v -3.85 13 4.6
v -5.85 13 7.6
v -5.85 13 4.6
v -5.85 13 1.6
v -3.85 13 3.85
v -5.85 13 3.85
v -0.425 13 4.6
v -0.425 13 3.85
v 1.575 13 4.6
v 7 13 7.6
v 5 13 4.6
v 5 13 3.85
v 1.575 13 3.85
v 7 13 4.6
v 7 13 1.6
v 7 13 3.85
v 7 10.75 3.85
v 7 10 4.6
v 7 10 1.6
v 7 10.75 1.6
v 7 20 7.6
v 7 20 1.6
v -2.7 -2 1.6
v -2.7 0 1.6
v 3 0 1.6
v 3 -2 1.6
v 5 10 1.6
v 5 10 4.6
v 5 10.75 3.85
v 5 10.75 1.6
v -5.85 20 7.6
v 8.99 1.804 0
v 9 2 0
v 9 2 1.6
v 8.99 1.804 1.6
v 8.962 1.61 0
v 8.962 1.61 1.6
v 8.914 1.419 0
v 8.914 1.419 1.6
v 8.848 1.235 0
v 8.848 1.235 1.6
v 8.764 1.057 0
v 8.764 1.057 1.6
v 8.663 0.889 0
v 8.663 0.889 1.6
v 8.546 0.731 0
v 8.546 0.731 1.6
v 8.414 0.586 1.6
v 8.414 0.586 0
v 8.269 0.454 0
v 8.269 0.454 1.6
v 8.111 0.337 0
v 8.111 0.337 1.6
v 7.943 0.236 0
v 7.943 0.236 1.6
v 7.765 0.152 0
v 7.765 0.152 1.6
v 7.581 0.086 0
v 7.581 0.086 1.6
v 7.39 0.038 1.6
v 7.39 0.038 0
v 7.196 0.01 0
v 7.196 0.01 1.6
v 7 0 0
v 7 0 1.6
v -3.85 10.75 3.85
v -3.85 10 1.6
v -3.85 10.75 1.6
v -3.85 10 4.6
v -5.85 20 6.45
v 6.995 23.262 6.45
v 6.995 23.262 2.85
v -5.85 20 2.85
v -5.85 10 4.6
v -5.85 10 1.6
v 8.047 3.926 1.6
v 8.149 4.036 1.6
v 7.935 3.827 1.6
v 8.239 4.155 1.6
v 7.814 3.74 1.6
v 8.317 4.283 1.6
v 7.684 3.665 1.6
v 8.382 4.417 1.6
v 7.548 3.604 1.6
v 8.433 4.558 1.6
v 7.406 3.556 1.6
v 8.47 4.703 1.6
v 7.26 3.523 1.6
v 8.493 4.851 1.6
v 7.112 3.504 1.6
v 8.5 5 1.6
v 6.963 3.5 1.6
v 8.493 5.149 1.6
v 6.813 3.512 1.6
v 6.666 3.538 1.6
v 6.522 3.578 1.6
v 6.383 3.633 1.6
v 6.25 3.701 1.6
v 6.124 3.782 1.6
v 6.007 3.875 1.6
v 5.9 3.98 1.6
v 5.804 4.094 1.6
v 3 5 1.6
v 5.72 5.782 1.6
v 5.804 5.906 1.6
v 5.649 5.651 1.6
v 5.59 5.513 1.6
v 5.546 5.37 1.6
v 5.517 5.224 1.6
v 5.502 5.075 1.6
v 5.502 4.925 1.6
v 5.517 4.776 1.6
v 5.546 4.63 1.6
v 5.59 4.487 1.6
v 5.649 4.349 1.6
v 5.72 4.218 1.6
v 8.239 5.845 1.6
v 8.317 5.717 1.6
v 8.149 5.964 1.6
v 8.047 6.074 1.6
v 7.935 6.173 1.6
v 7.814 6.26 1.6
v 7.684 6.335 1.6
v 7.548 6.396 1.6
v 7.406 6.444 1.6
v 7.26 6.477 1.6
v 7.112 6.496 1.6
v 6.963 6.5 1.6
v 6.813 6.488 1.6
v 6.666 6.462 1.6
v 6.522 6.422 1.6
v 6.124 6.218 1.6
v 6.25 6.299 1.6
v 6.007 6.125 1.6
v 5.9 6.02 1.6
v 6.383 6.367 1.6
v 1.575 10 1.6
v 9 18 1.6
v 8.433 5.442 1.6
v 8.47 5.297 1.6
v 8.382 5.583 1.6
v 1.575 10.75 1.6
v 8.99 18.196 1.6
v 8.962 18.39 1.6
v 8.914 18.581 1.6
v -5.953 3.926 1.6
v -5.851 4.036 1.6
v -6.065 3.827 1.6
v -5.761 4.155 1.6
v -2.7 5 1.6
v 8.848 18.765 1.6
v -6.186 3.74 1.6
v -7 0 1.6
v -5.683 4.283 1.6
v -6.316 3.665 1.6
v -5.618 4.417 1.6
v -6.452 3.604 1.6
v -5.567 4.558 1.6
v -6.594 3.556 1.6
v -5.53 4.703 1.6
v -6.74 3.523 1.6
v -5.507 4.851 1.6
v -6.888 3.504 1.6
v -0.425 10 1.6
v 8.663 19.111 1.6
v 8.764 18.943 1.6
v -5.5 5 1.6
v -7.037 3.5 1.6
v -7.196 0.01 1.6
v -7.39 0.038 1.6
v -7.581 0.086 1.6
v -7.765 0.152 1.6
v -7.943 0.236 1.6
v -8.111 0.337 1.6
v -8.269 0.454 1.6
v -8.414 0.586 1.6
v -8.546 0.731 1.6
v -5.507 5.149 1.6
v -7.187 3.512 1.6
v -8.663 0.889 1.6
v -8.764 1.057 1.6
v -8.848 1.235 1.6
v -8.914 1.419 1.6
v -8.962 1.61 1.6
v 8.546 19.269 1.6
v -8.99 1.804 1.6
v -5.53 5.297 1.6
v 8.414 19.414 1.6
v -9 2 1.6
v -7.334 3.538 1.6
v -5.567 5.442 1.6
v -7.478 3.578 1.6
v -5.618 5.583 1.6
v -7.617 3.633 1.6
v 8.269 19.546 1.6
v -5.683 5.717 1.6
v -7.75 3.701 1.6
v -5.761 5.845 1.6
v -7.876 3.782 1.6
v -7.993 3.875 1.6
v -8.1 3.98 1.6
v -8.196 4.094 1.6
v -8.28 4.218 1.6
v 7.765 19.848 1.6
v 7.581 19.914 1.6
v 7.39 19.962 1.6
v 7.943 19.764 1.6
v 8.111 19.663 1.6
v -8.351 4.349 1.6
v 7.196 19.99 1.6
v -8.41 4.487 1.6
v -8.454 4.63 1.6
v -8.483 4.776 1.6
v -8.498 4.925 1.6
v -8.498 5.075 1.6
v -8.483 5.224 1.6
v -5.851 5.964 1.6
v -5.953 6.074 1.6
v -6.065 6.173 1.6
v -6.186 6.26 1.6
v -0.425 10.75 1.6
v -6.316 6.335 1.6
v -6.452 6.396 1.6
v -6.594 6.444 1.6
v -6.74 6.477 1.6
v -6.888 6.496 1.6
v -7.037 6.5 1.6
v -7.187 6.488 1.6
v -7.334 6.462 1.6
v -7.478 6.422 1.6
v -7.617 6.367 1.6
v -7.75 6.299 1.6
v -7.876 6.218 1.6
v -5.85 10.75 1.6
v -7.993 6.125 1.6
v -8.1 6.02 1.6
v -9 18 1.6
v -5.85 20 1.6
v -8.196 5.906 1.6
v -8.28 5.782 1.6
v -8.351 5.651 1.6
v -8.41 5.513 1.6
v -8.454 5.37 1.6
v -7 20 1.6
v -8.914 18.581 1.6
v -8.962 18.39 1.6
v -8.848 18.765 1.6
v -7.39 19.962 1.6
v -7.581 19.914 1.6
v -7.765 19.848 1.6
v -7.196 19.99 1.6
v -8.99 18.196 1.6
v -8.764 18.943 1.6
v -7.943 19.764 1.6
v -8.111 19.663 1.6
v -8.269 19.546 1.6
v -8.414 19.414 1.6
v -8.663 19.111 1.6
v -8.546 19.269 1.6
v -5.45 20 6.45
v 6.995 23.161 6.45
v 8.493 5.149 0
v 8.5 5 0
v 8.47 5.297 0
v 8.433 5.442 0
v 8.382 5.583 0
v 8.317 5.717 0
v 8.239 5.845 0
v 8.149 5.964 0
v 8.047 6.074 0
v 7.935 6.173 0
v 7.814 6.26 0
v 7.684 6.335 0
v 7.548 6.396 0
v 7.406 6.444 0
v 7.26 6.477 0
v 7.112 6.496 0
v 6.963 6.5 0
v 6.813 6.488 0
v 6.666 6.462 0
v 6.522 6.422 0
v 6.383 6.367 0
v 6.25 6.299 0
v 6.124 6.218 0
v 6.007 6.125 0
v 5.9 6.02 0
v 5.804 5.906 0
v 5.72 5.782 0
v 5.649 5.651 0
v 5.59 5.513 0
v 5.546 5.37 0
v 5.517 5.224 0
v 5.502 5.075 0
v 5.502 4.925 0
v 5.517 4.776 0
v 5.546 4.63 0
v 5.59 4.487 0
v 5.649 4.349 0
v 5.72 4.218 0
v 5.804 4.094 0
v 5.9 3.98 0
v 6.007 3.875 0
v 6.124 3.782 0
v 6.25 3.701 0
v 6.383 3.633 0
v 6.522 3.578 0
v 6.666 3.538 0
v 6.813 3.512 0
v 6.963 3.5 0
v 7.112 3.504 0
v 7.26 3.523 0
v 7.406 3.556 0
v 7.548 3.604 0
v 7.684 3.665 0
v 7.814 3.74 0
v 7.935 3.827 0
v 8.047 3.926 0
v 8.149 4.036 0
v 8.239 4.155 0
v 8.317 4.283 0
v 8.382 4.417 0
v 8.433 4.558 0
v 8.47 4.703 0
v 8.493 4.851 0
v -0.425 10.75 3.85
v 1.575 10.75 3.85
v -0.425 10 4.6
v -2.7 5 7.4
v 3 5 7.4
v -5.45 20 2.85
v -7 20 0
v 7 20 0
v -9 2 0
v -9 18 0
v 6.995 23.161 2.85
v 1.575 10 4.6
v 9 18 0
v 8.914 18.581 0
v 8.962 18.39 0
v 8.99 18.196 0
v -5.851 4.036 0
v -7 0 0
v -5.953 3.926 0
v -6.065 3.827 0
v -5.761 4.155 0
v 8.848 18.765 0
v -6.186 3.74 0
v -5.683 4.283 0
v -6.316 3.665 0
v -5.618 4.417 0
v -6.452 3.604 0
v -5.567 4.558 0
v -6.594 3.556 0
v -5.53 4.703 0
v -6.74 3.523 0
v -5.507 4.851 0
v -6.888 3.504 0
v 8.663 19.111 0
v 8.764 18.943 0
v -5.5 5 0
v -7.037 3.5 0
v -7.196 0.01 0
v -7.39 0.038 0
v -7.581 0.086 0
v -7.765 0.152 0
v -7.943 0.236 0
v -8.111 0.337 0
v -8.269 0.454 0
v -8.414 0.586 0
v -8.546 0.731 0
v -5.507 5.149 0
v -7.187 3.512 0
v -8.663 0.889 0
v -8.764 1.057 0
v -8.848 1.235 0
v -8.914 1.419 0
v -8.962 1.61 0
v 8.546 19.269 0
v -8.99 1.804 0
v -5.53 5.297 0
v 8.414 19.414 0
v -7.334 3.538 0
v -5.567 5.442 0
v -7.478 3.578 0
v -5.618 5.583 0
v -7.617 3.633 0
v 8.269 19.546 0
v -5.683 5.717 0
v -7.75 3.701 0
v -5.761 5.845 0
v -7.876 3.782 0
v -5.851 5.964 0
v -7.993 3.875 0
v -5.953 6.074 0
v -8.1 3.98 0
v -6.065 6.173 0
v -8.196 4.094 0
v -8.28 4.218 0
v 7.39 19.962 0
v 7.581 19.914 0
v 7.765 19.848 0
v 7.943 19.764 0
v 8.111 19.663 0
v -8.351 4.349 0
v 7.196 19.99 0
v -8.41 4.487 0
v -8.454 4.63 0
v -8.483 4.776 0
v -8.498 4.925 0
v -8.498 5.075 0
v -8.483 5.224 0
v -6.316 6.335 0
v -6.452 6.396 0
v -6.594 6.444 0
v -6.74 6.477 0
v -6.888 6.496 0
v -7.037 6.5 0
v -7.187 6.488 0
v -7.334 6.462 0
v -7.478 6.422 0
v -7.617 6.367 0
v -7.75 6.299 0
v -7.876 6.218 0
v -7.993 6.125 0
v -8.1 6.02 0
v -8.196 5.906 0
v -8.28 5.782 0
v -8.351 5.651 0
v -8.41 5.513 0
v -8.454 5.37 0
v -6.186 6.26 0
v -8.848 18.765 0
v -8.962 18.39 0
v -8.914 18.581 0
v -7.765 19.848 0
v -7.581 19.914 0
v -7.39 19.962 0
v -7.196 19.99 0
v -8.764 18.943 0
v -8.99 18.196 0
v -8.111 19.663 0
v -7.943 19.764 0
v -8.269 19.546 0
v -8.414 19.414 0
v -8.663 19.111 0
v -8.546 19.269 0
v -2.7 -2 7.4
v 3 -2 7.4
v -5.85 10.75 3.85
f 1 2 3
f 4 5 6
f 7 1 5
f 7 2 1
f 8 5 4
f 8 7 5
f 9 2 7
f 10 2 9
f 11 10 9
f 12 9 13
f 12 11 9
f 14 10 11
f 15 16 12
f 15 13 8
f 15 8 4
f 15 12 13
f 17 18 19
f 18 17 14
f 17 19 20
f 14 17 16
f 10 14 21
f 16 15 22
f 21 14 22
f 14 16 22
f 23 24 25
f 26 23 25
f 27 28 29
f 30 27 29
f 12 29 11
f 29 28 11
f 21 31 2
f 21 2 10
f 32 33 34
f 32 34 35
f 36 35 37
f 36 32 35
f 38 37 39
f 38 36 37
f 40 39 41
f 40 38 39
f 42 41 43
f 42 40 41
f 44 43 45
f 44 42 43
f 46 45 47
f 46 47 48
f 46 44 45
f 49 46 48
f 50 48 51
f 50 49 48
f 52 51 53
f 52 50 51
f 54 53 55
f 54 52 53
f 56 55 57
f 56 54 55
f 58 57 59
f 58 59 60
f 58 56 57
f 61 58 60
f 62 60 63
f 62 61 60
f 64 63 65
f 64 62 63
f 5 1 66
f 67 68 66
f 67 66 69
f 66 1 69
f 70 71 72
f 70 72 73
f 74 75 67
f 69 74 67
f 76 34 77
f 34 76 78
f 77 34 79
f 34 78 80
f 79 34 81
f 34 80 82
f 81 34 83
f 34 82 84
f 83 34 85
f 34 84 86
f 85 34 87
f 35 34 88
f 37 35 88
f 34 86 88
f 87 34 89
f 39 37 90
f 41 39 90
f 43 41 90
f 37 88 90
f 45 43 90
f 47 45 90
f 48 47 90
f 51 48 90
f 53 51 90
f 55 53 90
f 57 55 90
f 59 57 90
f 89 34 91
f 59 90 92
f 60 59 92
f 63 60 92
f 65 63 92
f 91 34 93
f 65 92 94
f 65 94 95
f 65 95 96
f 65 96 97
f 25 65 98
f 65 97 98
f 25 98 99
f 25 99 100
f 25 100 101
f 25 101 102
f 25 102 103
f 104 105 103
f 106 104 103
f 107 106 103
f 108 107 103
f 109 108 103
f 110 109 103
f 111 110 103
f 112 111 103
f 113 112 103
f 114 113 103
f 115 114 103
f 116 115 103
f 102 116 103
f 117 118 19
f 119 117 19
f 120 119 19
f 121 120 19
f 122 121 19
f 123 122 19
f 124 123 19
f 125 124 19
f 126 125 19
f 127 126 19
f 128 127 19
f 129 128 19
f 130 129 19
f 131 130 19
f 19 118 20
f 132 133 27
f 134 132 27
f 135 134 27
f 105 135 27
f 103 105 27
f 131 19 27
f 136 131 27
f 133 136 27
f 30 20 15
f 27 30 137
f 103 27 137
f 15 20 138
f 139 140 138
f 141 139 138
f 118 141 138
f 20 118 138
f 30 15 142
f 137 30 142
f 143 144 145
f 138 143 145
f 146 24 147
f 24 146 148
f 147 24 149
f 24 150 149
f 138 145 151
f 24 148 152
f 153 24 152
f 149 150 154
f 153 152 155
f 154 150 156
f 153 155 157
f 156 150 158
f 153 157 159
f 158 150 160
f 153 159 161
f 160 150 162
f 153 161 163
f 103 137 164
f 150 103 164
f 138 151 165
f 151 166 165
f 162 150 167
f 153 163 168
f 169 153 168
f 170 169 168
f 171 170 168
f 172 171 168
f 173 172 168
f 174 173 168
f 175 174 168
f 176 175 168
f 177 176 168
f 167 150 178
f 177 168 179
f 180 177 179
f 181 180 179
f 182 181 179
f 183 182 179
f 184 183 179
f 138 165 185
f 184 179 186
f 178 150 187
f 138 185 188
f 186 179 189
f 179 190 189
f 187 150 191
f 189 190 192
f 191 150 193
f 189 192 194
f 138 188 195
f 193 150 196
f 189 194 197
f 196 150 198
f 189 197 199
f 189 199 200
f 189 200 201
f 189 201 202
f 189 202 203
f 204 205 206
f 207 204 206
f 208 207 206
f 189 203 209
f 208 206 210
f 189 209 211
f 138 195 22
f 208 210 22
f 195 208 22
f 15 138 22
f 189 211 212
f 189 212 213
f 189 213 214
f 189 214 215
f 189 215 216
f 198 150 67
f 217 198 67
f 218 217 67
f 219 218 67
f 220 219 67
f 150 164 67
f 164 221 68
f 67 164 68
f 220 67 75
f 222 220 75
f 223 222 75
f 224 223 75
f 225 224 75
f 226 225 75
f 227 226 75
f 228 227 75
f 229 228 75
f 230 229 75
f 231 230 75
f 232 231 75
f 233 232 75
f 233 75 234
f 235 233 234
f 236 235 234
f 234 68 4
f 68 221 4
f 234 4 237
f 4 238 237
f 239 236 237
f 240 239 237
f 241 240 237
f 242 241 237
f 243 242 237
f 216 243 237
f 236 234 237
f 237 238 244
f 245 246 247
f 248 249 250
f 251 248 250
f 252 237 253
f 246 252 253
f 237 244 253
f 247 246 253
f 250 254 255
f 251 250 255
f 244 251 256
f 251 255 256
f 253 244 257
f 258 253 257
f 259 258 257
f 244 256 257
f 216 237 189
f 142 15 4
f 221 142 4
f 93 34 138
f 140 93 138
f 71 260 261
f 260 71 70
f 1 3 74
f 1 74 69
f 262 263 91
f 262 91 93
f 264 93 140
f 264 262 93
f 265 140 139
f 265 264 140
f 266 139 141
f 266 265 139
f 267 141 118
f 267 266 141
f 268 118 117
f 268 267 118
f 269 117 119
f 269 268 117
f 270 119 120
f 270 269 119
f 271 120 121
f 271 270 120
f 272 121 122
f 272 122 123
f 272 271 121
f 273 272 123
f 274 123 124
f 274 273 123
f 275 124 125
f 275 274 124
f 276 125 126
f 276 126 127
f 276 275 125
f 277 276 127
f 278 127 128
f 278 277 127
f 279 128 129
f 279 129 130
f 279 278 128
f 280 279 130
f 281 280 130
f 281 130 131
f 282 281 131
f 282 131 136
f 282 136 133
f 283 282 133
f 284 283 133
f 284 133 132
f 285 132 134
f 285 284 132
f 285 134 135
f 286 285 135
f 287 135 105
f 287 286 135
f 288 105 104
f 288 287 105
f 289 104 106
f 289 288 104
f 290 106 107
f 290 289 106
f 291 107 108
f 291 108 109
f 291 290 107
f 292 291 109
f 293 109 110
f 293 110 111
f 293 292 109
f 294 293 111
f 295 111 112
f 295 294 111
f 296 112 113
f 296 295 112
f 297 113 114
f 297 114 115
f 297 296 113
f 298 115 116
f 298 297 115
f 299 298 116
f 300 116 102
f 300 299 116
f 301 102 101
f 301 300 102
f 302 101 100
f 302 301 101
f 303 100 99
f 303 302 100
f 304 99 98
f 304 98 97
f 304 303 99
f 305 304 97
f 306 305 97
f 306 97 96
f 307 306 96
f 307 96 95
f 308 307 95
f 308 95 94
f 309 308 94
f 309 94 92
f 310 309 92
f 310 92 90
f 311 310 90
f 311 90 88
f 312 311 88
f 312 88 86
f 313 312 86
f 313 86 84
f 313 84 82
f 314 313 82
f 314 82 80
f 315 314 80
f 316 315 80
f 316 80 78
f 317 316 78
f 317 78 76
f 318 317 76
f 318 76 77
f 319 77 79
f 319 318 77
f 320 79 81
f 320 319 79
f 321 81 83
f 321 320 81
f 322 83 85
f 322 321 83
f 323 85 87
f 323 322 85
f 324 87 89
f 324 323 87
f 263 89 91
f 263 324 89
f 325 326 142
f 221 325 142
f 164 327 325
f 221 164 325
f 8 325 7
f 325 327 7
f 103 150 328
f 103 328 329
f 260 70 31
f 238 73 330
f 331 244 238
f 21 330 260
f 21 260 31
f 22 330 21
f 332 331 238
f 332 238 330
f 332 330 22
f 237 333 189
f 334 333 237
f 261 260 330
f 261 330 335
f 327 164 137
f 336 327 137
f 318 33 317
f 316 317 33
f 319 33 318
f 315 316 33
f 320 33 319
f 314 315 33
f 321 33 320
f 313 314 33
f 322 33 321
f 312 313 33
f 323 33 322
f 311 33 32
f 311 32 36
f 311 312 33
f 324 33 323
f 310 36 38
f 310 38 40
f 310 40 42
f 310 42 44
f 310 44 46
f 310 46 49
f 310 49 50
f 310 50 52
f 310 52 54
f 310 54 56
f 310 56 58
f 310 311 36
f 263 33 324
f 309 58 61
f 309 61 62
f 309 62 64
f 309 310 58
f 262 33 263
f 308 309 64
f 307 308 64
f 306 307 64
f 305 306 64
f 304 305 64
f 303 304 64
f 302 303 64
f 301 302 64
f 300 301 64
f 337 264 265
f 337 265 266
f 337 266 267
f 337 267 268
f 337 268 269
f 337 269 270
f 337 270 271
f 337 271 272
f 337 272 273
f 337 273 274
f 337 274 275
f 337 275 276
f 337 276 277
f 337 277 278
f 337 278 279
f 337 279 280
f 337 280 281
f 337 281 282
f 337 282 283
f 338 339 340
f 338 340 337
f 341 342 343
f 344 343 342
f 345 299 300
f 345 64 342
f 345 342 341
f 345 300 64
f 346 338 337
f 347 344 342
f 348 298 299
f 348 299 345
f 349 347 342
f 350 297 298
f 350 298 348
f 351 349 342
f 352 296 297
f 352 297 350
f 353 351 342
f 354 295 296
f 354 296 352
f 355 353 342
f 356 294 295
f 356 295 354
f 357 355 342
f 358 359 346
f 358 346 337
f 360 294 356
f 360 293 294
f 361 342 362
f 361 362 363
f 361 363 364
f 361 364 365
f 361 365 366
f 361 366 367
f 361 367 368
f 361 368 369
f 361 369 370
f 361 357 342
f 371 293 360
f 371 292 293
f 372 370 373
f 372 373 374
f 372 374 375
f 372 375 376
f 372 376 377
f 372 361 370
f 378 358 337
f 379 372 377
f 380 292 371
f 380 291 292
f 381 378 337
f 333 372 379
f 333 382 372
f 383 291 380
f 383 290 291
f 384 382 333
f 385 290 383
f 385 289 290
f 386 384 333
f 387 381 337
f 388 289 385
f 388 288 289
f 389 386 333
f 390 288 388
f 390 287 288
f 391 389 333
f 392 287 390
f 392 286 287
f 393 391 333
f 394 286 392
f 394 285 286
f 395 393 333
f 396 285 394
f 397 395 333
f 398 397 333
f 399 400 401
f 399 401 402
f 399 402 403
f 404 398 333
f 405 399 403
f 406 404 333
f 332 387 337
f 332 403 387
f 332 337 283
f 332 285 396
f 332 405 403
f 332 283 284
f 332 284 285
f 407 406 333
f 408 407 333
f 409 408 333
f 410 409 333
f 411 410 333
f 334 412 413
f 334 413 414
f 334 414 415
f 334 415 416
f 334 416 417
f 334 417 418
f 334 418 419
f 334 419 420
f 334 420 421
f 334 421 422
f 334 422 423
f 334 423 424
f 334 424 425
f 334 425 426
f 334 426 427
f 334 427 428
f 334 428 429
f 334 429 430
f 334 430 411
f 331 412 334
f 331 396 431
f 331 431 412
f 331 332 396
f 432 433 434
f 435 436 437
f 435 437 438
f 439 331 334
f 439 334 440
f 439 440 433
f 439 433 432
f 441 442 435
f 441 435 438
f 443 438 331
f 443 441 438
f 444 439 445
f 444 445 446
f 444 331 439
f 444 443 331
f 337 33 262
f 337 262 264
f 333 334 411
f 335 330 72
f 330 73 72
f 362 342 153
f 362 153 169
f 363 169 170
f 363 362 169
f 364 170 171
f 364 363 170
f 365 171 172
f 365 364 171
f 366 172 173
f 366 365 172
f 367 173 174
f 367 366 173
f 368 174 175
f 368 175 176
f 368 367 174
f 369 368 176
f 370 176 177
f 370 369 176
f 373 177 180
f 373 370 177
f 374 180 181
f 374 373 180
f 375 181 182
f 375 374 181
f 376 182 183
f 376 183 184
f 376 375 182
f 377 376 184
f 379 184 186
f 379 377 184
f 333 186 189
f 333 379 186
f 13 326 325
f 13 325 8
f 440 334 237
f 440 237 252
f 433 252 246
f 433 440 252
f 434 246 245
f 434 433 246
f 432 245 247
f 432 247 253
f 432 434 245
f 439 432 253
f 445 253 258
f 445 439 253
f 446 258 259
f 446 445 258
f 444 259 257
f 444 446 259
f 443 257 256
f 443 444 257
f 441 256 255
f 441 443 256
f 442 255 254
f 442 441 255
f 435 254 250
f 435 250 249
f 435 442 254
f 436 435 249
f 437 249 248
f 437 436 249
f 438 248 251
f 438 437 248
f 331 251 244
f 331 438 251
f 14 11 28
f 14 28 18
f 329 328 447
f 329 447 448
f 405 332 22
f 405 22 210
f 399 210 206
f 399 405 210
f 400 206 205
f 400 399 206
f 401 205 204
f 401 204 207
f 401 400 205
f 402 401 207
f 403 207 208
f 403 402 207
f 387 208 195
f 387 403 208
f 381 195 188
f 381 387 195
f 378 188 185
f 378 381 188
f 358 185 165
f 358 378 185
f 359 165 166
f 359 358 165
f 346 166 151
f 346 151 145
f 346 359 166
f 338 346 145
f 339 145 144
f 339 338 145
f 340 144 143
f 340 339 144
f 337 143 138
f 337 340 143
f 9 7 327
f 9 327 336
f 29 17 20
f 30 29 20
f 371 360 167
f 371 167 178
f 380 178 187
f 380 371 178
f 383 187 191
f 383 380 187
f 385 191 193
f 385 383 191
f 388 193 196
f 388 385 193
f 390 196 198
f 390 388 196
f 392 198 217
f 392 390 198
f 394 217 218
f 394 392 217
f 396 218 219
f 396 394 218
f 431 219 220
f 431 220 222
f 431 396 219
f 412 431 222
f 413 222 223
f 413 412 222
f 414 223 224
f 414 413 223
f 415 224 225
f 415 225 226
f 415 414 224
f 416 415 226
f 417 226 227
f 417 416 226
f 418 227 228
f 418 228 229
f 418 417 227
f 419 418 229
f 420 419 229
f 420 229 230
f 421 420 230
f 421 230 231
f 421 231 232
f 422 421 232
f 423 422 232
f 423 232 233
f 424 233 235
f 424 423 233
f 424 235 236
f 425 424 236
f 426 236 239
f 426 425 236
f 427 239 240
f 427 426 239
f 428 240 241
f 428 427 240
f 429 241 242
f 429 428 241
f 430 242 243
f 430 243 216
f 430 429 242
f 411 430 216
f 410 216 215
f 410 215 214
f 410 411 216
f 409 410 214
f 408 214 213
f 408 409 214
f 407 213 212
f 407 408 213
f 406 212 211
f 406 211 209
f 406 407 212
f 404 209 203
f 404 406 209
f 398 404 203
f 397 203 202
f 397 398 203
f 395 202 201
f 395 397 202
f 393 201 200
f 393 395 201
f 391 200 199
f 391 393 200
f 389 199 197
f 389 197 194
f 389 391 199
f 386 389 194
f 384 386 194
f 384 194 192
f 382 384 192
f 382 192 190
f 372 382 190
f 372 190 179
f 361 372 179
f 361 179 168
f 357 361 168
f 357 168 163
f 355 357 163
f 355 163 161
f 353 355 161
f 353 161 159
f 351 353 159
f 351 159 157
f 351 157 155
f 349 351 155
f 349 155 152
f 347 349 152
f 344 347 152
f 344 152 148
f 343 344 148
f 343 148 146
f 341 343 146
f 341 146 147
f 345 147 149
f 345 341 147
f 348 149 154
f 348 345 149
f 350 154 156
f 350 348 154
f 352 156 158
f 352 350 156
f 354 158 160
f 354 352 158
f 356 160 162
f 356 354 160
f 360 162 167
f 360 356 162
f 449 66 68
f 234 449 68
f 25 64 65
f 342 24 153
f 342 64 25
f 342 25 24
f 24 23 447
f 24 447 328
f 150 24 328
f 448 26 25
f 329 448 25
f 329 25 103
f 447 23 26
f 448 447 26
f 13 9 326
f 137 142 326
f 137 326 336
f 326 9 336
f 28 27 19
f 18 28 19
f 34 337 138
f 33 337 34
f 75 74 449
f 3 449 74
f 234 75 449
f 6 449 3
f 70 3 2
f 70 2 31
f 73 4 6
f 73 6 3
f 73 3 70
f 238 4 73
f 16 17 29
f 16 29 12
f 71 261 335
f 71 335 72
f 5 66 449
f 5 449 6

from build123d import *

# Parameters (mm, degrees)
SKETCH1_R           = 1.5
BOSS_EXTRUDE1_DEPTH = 1.6
SKETCH2_W           = 12.85
SKETCH2_H           = 10
BOSS_EXTRUDE2_DEPTH = 6
SKETCH3_W           = 12.85
SKETCH3_H           = 3
CUT_EXTRUDE1_DEPTH  = 3
CUT_EXTRUDE3_DEPTH  = 3
SKETCH5_W           = 2.25
SKETCH5_H           = 2.25
CUT_EXTRUDE4_DEPTH  = 17
BOSS_EXTRUDE4_DEPTH = 4.75
SKETCH11_W          = 12.85
SKETCH11_H          = 1.15
CUT_EXTRUDE8_DEPTH  = 4.75
SKETCH_1_W          = 5.7
SKETCH_1_H          = 7
EXTRUDE_1_DEPTH     = 5.8


with BuildPart() as part:
    # Sketch1 → Boss-Extrude1 (new body)
    with BuildSketch(Plane.XY):
        with BuildLine():
            Line((-7, 20), (7, 20))
            ThreePointArc((7, 20), (8.414213562, 19.414213562), (9, 18))
            Line((9, 18), (9, 2))
            ThreePointArc((9, 2), (8.414213562, 0.585786438), (7, 0))
            Line((7, 0), (-7, 0))
            ThreePointArc((-7, 0), (-8.414213562, 0.585786438), (-9, 2))
            Line((-9, 2), (-9, 18))
            ThreePointArc((-9, 18), (-8.414213562, 19.414213562), (-7, 20))
        make_face()
        with Locations((7, 5)):
            Circle(SKETCH1_R, mode=Mode.SUBTRACT)
        with Locations((-7, 5)):
            Circle(SKETCH1_R, mode=Mode.SUBTRACT)
    extrude(amount=BOSS_EXTRUDE1_DEPTH)

    # Sketch2 → Boss-Extrude2 (add)
    with BuildSketch(Plane.XY.offset(1.6)):
        with Locations((0.575, 15)):
            Rectangle(SKETCH2_W, SKETCH2_H)
    extrude(amount=BOSS_EXTRUDE2_DEPTH)

    # Sketch3 → Cut-Extrude1 (cut)
    with BuildSketch(Plane.XY.offset(7.6)):
        with Locations((0.575, 11.5)):
            Rectangle(SKETCH3_W, SKETCH3_H)
    extrude(amount=-CUT_EXTRUDE1_DEPTH, mode=Mode.SUBTRACT)

    # Sketch4 → Cut-Extrude3 (cut)
    with BuildSketch(Plane.XY.offset(4.6)):
        Polygon((5, 13), (1.575, 13), (1.575, 10), (5, 10), (5, 11.5), align=None)
        Polygon((-0.425, 13), (-3.85, 13), (-3.85, 11.5), (-3.85, 10), (-0.425, 10), align=None)
    extrude(amount=-CUT_EXTRUDE3_DEPTH, mode=Mode.SUBTRACT)

    # Sketch5 → Cut-Extrude4 (cut, through all)
    with BuildSketch(Plane(origin=(7, 0, 0), x_dir=(0, 0, -1), z_dir=(1, 0, 0))):
        with Locations((-2.725, 11.875)):
            Rectangle(SKETCH5_W, SKETCH5_H)
    extrude(amount=-CUT_EXTRUDE4_DEPTH, mode=Mode.SUBTRACT)

    # Sketch10 → Boss-Extrude4 (add)
    with BuildSketch(Plane.XY.offset(7.6)):
        Polygon((6.995, 23.262214419), (-5.85, 20), (-5.45, 20), (6.995, 23.16062736), align=None)
    extrude(amount=-BOSS_EXTRUDE4_DEPTH)

    # Sketch11 → Cut-Extrude8 (cut)
    with BuildSketch(Plane(origin=(0, 20, 0), x_dir=(1, 0, 0), z_dir=(0, 1, 0))):
        with Locations((0.575, -7.025)):
            Rectangle(SKETCH11_W, SKETCH11_H)
    extrude(amount=CUT_EXTRUDE8_DEPTH, mode=Mode.SUBTRACT)

    # 草图1 → 凸台-拉伸1 (add)
    with BuildSketch(Plane.XY.offset(1.6)):
        with Locations((0.15, 1.5)):
            Rectangle(SKETCH_1_W, SKETCH_1_H)
    extrude(amount=EXTRUDE_1_DEPTH)


solid = part.part
